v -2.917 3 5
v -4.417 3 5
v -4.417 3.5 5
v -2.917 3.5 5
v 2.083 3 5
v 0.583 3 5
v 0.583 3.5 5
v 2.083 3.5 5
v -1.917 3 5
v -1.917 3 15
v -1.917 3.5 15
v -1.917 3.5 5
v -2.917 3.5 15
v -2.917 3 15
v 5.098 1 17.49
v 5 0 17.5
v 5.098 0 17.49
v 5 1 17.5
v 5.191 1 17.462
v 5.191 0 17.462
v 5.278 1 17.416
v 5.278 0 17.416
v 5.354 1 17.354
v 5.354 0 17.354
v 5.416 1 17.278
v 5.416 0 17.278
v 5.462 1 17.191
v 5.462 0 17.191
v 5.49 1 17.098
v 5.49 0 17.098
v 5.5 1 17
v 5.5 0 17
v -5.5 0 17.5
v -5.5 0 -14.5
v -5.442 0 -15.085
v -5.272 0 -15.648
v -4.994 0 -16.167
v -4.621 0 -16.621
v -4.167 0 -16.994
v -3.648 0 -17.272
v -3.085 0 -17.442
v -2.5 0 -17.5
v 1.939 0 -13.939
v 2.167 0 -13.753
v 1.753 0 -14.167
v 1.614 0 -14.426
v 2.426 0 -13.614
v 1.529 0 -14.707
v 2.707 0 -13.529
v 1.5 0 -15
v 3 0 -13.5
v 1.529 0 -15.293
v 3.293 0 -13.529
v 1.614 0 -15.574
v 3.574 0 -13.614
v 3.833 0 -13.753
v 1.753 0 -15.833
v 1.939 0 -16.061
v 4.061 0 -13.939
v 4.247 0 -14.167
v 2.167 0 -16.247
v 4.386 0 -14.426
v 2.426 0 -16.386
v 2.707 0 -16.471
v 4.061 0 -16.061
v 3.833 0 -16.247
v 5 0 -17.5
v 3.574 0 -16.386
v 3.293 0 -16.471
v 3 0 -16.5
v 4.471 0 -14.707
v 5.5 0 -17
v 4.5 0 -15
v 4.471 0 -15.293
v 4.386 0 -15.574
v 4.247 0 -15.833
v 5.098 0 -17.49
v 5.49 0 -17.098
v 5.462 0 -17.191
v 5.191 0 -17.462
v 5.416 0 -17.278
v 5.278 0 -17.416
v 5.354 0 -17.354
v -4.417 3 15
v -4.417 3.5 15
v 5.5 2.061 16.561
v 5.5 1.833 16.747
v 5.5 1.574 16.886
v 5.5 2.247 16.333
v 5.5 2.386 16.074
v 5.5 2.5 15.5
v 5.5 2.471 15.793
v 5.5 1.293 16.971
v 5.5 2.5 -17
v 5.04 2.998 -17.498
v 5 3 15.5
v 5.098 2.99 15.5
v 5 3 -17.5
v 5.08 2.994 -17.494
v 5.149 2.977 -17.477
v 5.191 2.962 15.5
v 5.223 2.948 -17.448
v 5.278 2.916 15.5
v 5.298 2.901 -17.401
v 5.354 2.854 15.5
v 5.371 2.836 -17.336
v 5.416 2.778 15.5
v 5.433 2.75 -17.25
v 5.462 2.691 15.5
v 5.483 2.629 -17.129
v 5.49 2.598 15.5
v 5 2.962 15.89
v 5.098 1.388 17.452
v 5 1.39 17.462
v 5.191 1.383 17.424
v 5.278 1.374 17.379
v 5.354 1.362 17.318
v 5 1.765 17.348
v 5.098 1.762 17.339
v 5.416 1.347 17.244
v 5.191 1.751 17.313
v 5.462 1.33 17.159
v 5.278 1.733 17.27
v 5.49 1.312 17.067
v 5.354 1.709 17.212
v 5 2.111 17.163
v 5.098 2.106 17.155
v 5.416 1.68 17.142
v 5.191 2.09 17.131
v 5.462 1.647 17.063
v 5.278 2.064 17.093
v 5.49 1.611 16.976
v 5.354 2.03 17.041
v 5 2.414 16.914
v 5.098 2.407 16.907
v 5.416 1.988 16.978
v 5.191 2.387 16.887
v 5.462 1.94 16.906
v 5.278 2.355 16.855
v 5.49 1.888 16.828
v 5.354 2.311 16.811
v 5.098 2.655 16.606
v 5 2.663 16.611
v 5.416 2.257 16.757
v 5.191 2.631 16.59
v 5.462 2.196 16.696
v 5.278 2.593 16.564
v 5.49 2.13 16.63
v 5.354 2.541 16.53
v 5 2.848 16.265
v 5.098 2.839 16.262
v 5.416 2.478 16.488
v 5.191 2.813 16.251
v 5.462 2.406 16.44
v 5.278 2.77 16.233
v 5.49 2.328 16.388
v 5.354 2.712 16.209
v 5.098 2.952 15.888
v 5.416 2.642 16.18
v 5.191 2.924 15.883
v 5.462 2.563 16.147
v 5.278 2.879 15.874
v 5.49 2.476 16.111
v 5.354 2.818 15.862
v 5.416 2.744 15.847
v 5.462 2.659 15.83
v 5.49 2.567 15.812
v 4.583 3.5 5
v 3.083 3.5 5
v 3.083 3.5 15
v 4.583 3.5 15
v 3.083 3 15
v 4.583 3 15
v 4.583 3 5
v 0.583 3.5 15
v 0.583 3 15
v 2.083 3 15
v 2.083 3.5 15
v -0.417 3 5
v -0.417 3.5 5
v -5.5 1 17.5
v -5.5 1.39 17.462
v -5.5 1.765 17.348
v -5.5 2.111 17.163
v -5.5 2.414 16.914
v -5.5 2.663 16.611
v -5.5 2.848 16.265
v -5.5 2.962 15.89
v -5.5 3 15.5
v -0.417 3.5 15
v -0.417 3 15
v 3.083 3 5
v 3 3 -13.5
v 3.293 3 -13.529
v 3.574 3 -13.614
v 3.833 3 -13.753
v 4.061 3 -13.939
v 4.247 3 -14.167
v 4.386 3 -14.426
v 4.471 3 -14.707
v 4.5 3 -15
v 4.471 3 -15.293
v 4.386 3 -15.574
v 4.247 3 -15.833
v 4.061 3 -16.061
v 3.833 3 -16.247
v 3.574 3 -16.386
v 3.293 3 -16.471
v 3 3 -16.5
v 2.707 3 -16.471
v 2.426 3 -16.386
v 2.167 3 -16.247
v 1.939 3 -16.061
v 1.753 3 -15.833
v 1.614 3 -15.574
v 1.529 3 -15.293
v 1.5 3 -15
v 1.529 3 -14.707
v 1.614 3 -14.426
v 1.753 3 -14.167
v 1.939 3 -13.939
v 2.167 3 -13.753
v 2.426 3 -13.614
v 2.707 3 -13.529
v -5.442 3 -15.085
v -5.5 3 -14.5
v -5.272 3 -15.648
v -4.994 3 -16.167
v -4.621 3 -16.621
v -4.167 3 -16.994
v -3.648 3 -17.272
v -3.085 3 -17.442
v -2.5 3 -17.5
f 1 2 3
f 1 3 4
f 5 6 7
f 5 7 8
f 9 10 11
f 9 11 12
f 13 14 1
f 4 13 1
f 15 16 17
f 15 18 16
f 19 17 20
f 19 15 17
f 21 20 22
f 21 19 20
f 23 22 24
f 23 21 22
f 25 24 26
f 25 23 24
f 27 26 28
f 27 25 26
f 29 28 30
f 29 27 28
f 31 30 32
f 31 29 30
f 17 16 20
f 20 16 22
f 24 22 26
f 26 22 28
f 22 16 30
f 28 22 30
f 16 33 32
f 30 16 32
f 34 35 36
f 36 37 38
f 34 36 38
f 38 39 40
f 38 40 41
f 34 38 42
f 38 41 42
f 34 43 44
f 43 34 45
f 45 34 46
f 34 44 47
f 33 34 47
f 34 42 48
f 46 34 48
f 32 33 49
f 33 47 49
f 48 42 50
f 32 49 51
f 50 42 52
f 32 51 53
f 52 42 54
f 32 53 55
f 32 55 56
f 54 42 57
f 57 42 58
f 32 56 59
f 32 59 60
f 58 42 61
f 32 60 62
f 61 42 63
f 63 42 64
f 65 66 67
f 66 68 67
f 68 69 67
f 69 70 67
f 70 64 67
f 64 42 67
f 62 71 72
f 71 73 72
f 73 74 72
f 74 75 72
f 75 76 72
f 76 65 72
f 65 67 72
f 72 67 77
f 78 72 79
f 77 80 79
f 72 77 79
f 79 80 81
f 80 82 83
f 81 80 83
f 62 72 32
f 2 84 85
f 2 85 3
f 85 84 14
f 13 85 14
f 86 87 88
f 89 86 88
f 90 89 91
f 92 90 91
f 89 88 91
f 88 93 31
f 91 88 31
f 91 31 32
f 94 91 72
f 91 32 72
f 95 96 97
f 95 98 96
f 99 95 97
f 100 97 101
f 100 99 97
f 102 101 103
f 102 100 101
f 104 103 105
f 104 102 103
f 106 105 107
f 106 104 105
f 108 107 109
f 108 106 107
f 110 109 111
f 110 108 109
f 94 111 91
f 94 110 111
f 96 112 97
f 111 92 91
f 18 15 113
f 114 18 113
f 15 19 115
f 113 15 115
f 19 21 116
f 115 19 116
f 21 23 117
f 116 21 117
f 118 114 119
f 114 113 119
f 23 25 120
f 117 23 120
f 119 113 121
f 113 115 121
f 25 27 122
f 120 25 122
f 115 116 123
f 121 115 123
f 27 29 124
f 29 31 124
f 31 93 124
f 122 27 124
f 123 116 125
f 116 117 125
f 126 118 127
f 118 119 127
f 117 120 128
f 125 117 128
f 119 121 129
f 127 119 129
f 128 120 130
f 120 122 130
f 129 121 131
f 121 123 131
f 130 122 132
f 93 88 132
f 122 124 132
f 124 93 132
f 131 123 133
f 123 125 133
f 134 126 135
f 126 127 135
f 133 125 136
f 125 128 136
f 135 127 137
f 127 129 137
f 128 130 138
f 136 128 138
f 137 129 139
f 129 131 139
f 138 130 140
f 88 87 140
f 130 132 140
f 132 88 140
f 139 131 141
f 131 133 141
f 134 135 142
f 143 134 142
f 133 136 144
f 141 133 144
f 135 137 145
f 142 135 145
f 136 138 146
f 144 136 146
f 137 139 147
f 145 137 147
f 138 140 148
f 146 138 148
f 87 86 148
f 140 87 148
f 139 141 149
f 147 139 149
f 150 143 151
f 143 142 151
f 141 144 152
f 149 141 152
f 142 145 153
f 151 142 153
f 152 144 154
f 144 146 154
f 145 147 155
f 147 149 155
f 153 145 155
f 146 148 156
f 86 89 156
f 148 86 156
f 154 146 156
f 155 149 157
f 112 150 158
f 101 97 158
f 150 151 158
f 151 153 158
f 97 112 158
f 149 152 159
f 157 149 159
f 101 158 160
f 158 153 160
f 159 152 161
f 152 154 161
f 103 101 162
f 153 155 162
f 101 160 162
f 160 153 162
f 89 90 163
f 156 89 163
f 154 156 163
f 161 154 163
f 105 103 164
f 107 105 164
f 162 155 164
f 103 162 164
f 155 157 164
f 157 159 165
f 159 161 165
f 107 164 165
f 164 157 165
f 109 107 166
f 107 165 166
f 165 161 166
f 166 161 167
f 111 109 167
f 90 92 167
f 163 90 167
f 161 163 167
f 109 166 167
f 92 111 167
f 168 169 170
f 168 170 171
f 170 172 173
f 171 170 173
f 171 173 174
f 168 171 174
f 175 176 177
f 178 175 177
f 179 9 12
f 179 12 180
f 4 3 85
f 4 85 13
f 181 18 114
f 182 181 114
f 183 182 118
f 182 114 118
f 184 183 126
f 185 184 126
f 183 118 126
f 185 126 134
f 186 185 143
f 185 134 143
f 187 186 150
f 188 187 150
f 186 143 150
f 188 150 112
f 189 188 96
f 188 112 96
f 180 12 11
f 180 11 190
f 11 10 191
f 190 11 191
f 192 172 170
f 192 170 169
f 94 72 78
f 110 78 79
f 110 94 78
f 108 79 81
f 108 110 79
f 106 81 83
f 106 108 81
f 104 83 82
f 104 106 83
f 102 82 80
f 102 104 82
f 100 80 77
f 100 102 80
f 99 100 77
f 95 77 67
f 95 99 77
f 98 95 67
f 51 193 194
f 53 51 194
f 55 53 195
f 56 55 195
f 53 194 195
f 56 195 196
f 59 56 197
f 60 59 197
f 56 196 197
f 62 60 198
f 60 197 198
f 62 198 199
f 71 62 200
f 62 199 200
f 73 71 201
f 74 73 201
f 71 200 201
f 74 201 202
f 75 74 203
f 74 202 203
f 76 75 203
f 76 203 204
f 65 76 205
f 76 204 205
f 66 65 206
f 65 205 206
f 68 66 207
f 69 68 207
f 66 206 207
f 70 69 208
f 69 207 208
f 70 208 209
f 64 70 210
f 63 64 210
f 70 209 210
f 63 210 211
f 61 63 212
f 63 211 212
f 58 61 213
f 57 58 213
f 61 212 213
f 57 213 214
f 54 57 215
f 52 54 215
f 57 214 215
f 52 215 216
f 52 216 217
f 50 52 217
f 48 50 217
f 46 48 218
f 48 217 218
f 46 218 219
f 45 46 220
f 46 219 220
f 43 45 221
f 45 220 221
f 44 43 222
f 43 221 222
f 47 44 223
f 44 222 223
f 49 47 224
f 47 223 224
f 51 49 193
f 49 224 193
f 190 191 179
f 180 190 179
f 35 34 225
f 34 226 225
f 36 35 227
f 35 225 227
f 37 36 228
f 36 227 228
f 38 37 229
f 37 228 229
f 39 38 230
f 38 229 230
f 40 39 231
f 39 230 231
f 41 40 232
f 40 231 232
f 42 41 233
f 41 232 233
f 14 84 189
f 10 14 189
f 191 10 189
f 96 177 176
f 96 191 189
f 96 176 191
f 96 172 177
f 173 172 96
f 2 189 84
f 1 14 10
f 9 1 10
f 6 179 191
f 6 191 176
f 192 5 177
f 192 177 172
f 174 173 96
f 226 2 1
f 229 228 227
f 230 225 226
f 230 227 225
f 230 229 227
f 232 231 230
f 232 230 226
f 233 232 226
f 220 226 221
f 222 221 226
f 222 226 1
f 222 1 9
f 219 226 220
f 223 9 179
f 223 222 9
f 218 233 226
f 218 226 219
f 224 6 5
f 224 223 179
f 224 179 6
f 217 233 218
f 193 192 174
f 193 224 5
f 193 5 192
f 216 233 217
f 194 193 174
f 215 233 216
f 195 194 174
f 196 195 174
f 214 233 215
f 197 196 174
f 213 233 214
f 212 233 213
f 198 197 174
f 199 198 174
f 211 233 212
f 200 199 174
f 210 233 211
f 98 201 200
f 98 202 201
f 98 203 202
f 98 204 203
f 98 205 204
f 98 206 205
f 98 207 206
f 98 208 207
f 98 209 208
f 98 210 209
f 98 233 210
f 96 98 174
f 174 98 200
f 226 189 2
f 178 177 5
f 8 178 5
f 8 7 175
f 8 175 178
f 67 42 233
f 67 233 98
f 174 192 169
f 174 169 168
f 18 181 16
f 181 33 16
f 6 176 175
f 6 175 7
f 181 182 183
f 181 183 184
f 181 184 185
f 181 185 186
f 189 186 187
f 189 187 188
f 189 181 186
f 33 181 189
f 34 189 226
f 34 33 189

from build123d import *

# Parameters (mm, degrees)
SKETCH1_W           = 11
SKETCH1_H           = 35
BOSS_EXTRUDE1_DEPTH = 3
SKETCH2_R           = 1.5
CUT_EXTRUDE1_DEPTH  = 3
FILLET1_R           = 3
SKETCH3_W           = 1.5
SKETCH3_H           = 10
BOSS_EXTRUDE2_DEPTH = 0.5
FILLET4_R           = 2
FILLET5_R           = 0.5


with BuildPart() as part:
    # Sketch1 → Boss-Extrude1 (new body)
    with BuildSketch(Plane(origin=(0, 0, 0), x_dir=(1, 0, 0), z_dir=(0, 1, 0))):
        Rectangle(SKETCH1_W, SKETCH1_H)
    extrude(amount=BOSS_EXTRUDE1_DEPTH)

    # Sketch2 → Cut-Extrude1 (cut)
    with BuildSketch(Plane(origin=(0, 3, 0), x_dir=(1, 0, 0), z_dir=(0, 1, 0))):
        with Locations(Location((3, 15, 0), (0, 0, 270))):
            Circle(SKETCH2_R)
    extrude(amount=-CUT_EXTRUDE1_DEPTH, mode=Mode.SUBTRACT)

    # Fillet1
    fillet1_edges = [part.edges().sort_by_distance(p)[0] for p in [
        (-5.5, 1.5, -17.5),
    ]]
    fillet(fillet1_edges, radius=FILLET1_R)

    # Sketch3 → Boss-Extrude2 (add)
    with BuildSketch(Plane(origin=(0, 3, 0), x_dir=(1, 0, 0), z_dir=(0, 1, 0))):
        with Locations((-1.167481663, -10)):
            Rectangle(SKETCH3_W, SKETCH3_H)
        with Locations((-3.667481663, -10)):
            Rectangle(SKETCH3_W, SKETCH3_H)
        with Locations((1.332518337, -10)):
            Rectangle(SKETCH3_W, SKETCH3_H)
        with Locations((3.832518337, -10)):
            Rectangle(SKETCH3_W, SKETCH3_H)
    extrude(amount=BOSS_EXTRUDE2_DEPTH)

    # Fillet4
    fillet4_edges = [part.edges().sort_by_distance(p)[0] for p in [
        (0, 3, 17.5),
    ]]
    fillet(fillet4_edges, radius=FILLET4_R)

    # Fillet5
    fillet5_edges = [part.edges().sort_by_distance(p)[0] for p in [
        (5.5, 1.5, -17.5),
        (5.5, 3, -1),
        (5.5, 0.5, 17.5),
        (5.5, 2.414213562, 16.914213562),
    ]]
    fillet(fillet5_edges, radius=FILLET5_R)


solid = part.part
